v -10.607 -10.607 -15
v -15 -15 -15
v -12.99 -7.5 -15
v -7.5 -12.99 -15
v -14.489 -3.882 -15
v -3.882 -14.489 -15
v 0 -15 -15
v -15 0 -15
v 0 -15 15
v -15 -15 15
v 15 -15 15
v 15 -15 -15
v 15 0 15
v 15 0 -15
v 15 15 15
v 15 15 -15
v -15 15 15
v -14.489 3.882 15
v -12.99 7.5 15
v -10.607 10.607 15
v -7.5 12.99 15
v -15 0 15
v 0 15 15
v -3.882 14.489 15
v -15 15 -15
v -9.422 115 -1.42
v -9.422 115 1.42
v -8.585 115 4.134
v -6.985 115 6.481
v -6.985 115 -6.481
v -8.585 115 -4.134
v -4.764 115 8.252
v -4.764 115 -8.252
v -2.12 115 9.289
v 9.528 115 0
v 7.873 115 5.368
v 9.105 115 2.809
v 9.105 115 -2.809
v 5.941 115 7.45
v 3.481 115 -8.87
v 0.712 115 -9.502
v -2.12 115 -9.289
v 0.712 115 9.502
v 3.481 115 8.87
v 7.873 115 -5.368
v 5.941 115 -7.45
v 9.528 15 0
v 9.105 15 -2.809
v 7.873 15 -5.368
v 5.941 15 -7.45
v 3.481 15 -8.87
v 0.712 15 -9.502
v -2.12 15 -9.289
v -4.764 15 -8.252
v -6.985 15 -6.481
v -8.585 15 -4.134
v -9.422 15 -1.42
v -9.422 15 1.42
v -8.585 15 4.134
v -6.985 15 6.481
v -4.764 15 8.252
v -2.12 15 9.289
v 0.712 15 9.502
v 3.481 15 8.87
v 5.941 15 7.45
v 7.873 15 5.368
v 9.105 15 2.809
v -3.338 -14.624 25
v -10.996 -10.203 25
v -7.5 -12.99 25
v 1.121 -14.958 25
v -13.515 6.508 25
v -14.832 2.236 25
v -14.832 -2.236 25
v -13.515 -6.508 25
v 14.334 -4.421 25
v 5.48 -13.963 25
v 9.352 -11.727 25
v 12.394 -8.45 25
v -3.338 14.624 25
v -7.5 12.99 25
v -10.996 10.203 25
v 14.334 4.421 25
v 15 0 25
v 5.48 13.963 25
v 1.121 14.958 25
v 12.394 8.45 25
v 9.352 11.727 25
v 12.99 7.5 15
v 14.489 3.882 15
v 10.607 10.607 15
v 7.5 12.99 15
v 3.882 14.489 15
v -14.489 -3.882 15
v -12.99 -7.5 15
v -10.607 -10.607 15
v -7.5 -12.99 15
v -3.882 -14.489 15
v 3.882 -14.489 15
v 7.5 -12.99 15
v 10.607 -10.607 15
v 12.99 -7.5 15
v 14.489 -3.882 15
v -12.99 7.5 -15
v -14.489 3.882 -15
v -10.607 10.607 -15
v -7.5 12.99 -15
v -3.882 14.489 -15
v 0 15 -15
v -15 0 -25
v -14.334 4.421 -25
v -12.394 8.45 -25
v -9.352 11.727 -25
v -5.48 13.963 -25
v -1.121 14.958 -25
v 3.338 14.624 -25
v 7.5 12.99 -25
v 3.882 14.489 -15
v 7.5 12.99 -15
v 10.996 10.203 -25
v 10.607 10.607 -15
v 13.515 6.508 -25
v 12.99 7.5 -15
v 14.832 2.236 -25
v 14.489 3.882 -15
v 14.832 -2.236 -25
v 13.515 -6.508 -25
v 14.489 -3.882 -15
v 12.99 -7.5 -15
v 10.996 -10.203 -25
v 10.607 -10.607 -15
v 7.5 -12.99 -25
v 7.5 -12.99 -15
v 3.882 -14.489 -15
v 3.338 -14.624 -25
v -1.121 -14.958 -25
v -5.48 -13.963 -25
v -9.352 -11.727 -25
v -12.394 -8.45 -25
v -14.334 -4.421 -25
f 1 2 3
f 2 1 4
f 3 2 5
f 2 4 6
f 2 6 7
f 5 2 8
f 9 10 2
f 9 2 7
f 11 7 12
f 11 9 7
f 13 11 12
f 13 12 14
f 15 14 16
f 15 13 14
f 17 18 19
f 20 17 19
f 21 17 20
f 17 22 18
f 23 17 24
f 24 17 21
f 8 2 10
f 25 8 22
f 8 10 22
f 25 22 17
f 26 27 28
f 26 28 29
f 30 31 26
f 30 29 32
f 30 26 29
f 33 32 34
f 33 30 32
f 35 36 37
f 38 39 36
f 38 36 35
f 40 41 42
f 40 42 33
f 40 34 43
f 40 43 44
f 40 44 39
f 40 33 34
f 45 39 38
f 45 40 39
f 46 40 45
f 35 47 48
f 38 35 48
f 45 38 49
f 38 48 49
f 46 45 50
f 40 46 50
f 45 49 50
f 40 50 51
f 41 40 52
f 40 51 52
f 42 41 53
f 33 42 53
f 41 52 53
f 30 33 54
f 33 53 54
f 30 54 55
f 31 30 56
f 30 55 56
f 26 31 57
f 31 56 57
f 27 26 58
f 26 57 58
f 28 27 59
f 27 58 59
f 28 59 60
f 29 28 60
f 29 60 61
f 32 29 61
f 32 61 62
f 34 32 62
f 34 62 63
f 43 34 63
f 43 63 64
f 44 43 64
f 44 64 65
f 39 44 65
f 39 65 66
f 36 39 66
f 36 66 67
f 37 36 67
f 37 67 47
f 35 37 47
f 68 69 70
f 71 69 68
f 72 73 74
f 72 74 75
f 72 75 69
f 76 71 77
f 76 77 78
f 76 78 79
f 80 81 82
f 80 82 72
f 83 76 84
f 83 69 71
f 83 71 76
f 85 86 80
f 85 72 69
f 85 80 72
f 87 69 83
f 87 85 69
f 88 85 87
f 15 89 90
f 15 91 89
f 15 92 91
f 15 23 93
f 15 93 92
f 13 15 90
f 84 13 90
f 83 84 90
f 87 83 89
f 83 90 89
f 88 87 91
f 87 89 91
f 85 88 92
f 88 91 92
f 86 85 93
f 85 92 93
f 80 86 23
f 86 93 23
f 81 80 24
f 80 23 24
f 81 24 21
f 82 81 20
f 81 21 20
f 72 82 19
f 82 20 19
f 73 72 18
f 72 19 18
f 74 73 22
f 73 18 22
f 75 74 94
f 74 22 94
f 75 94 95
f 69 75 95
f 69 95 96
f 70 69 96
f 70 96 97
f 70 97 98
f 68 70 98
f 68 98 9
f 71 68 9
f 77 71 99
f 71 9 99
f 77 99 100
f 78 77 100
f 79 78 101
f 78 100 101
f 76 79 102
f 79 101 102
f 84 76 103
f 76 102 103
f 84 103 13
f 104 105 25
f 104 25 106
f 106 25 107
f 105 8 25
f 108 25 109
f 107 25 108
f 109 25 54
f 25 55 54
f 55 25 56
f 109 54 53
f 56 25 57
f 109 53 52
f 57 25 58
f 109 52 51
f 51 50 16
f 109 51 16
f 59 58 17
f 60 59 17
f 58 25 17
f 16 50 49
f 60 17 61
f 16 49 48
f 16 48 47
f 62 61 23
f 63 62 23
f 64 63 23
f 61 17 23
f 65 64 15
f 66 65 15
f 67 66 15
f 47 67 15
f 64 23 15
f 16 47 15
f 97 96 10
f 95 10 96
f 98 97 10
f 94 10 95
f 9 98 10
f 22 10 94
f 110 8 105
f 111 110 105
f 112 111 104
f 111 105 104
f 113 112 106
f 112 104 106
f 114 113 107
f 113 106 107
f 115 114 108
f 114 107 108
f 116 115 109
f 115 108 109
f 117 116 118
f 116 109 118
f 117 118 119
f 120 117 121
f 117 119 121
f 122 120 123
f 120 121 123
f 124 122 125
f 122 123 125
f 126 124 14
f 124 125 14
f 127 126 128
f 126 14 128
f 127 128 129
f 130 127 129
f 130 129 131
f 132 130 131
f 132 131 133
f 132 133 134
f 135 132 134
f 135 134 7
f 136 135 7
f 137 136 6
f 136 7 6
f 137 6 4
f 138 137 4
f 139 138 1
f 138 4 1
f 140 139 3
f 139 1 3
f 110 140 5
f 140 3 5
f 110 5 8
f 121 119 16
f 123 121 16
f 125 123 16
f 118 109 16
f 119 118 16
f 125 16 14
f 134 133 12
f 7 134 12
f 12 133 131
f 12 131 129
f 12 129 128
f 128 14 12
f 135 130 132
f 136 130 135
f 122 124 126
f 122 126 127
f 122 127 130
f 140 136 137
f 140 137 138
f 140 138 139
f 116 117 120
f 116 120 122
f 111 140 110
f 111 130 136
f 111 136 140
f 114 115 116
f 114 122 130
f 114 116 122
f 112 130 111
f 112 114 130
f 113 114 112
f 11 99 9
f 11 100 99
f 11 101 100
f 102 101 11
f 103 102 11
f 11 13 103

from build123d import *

# Parameters (mm, degrees)
SKETCH1_W           = 30
SKETCH1_H           = 30
BOSS_EXTRUDE2_DEPTH = 15
SKETCH2_R           = 15
BOSS_EXTRUDE3_DEPTH = 10
SKETCH3_R           = 15
BOSS_EXTRUDE4_DEPTH = 10
SKETCH4_R           = 9.528333781
CUT_EXTRUDE1_DEPTH  = 31
BOSS_EXTRUDE5_START = -30
SKETCH5_R           = 9.528333781
BOSS_EXTRUDE5_DEPTH = 130


with BuildPart() as part:
    # Sketch1 → Boss-Extrude2 (new body, symmetric)
    with BuildSketch(Plane.XY):
        Rectangle(SKETCH1_W, SKETCH1_H)
    extrude(amount=BOSS_EXTRUDE2_DEPTH, both=True)

    # Sketch2 → Boss-Extrude3 (add)
    with BuildSketch(Plane.XY.offset(15)):
        Circle(SKETCH2_R)
    extrude(amount=BOSS_EXTRUDE3_DEPTH)

    # Sketch3 → Boss-Extrude4 (add)
    with BuildSketch(Plane(origin=(0, 0, -15), x_dir=(-1, 0, 0), z_dir=(0, 0, -1))):
        Circle(SKETCH3_R)
    extrude(amount=BOSS_EXTRUDE4_DEPTH)

    # Sketch4 → Cut-Extrude1 (cut, through all)
    with BuildSketch(Plane(origin=(0, 15, 0), x_dir=(1, 0, 0), z_dir=(0, 1, 0))):
        Circle(SKETCH4_R)
    extrude(amount=-CUT_EXTRUDE1_DEPTH, mode=Mode.SUBTRACT)

    # Sketch5 → Boss-Extrude5 (add)
    with BuildSketch(Plane(origin=(0, 15, 0), x_dir=(1, 0, 0), z_dir=(0, 1, 0)).offset(BOSS_EXTRUDE5_START)):
        Circle(SKETCH5_R)
    extrude(amount=BOSS_EXTRUDE5_DEPTH)


solid = part.part
